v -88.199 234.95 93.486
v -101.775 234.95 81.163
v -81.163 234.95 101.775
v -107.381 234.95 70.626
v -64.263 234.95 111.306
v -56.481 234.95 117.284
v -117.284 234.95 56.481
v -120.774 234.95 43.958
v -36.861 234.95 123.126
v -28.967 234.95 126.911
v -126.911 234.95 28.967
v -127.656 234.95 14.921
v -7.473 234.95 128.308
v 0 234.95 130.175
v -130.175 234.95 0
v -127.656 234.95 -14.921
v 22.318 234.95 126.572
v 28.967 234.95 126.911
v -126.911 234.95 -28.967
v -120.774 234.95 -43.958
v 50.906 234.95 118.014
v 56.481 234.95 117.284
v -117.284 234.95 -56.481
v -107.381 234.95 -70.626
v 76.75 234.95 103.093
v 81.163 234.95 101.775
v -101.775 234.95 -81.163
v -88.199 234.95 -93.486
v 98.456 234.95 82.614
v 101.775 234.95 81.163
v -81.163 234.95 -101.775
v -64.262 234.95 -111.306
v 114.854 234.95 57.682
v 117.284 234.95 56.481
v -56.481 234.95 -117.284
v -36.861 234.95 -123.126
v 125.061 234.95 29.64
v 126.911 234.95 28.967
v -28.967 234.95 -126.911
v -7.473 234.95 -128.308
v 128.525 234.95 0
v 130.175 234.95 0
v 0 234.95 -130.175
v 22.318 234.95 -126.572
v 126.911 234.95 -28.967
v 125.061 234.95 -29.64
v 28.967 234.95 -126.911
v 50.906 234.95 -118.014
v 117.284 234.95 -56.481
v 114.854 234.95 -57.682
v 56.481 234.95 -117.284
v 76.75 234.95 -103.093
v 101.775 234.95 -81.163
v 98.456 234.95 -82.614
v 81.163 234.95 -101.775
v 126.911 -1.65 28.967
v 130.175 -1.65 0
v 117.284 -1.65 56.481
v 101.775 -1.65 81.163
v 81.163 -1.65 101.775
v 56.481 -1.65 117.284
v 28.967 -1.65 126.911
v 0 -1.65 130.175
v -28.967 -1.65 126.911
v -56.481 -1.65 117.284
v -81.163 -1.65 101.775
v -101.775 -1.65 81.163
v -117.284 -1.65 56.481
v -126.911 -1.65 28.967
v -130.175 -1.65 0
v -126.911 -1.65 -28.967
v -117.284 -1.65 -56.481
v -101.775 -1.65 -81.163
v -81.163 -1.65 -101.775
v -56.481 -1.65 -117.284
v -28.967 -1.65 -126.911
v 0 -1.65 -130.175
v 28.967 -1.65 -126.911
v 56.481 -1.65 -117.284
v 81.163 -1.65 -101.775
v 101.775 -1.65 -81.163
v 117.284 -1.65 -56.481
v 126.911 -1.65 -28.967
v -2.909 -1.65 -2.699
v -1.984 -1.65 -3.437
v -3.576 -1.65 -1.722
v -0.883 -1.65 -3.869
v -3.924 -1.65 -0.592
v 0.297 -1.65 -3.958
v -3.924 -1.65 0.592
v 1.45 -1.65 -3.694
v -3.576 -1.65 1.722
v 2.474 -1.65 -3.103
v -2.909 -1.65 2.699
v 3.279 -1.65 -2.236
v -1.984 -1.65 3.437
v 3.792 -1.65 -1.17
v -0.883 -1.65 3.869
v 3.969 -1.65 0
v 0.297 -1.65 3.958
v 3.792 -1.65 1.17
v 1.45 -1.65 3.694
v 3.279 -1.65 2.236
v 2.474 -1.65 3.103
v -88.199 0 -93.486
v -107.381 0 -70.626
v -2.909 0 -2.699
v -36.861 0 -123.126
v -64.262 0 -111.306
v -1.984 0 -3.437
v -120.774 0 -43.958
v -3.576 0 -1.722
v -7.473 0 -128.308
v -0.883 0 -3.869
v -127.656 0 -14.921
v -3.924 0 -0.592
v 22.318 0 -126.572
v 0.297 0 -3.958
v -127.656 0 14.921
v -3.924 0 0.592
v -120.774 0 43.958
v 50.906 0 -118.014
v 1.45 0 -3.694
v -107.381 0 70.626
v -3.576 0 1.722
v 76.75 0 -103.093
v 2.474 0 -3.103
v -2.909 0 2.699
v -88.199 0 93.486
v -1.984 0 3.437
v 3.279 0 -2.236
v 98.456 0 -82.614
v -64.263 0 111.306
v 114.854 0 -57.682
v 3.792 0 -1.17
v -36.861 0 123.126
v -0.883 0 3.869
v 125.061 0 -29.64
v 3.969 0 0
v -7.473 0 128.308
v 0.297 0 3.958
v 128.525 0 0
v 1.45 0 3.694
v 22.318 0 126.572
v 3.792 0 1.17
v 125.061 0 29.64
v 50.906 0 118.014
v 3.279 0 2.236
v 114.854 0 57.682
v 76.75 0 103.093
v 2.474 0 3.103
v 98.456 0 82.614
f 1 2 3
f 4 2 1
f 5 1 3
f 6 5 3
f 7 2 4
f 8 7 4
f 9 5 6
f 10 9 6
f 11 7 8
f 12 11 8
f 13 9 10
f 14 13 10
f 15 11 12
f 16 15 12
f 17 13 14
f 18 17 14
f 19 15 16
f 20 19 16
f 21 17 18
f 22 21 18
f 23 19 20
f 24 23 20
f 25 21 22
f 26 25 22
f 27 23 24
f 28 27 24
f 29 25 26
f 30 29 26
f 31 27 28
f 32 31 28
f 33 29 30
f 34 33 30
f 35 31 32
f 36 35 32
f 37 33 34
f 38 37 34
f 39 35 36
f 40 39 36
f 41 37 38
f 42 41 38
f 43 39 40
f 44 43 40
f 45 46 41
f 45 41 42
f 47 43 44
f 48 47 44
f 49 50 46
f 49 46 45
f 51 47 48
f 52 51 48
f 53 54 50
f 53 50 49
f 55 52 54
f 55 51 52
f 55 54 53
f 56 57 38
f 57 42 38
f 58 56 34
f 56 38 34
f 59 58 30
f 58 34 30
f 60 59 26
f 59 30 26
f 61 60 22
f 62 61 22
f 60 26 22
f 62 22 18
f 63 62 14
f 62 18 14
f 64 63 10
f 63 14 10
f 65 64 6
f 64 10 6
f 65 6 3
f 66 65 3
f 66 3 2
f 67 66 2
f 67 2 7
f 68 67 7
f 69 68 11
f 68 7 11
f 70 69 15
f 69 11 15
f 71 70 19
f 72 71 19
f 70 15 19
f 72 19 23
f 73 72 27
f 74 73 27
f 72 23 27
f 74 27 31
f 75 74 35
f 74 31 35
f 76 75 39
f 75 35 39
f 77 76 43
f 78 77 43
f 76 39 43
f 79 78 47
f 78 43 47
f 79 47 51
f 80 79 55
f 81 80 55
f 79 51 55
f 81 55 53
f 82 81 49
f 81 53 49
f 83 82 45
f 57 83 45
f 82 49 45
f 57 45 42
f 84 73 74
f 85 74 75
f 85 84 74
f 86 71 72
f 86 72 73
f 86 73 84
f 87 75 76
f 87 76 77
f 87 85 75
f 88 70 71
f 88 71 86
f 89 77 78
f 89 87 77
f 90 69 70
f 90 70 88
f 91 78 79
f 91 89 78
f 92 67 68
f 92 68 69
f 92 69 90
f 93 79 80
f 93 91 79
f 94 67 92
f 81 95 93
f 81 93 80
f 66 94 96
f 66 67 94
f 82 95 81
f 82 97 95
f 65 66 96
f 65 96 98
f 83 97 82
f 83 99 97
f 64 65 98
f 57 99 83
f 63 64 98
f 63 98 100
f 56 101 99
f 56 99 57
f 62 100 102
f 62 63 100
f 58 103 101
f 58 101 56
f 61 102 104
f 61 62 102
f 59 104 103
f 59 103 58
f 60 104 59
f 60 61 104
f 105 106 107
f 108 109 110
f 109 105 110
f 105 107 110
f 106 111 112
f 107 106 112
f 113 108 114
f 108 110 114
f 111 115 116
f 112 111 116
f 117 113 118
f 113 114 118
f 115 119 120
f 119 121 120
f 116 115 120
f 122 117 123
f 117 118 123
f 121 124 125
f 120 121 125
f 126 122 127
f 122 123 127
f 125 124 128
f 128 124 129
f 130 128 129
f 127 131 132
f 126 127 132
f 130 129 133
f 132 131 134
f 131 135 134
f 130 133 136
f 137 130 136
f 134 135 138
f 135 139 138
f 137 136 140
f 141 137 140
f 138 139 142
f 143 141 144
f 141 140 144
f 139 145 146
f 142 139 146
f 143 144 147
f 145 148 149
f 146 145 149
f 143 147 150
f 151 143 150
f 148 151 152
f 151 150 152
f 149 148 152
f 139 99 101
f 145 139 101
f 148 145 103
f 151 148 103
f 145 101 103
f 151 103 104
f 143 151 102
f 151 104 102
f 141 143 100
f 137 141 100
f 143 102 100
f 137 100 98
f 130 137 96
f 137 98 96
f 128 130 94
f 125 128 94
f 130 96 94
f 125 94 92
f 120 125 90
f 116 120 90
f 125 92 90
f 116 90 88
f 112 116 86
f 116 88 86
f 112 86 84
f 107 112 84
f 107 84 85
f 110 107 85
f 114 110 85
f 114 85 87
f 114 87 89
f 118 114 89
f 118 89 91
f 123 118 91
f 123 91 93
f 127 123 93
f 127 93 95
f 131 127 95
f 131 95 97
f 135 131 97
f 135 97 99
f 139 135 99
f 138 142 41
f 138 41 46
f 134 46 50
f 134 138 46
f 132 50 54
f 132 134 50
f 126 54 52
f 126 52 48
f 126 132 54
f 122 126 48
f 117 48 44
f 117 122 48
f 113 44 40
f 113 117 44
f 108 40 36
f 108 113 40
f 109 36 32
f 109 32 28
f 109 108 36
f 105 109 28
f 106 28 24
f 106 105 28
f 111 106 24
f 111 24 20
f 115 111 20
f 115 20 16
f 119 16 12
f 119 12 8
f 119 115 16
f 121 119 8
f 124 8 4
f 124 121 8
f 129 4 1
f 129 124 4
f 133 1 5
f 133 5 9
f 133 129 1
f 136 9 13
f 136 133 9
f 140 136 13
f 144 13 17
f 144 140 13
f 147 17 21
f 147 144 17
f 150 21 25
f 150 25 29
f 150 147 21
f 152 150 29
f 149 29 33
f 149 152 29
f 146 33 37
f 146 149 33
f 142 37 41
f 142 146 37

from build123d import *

# Parameters (mm, degrees)
SKETCH1_R           = 130.175
SKETCH1_R_2         = 128.525
BOSS_EXTRUDE1_DEPTH = 234.95
SKETCH2_R           = 130.175
BOSS_EXTRUDE2_DEPTH = 1.65
SKETCH3_R           = 3.96875
CUT_EXTRUDE1_DEPTH  = 237.6


with BuildPart() as part:
    # Sketch1 → Boss-Extrude1 (new body)
    with BuildSketch(Plane(origin=(0, 0, 0), x_dir=(1, 0, 0), z_dir=(0, 1, 0))):
        Circle(SKETCH1_R)
        Circle(SKETCH1_R_2, mode=Mode.SUBTRACT)
    extrude(amount=BOSS_EXTRUDE1_DEPTH)

    # Sketch2 → Boss-Extrude2 (add)
    with BuildSketch(Plane.XZ):
        Circle(SKETCH2_R)
    extrude(amount=BOSS_EXTRUDE2_DEPTH)

    # Sketch3 → Cut-Extrude1 (cut, through all)
    with BuildSketch(Plane.XZ.offset(1.65)):
        Circle(SKETCH3_R)
    extrude(amount=-CUT_EXTRUDE1_DEPTH, mode=Mode.SUBTRACT)


solid = part.part
